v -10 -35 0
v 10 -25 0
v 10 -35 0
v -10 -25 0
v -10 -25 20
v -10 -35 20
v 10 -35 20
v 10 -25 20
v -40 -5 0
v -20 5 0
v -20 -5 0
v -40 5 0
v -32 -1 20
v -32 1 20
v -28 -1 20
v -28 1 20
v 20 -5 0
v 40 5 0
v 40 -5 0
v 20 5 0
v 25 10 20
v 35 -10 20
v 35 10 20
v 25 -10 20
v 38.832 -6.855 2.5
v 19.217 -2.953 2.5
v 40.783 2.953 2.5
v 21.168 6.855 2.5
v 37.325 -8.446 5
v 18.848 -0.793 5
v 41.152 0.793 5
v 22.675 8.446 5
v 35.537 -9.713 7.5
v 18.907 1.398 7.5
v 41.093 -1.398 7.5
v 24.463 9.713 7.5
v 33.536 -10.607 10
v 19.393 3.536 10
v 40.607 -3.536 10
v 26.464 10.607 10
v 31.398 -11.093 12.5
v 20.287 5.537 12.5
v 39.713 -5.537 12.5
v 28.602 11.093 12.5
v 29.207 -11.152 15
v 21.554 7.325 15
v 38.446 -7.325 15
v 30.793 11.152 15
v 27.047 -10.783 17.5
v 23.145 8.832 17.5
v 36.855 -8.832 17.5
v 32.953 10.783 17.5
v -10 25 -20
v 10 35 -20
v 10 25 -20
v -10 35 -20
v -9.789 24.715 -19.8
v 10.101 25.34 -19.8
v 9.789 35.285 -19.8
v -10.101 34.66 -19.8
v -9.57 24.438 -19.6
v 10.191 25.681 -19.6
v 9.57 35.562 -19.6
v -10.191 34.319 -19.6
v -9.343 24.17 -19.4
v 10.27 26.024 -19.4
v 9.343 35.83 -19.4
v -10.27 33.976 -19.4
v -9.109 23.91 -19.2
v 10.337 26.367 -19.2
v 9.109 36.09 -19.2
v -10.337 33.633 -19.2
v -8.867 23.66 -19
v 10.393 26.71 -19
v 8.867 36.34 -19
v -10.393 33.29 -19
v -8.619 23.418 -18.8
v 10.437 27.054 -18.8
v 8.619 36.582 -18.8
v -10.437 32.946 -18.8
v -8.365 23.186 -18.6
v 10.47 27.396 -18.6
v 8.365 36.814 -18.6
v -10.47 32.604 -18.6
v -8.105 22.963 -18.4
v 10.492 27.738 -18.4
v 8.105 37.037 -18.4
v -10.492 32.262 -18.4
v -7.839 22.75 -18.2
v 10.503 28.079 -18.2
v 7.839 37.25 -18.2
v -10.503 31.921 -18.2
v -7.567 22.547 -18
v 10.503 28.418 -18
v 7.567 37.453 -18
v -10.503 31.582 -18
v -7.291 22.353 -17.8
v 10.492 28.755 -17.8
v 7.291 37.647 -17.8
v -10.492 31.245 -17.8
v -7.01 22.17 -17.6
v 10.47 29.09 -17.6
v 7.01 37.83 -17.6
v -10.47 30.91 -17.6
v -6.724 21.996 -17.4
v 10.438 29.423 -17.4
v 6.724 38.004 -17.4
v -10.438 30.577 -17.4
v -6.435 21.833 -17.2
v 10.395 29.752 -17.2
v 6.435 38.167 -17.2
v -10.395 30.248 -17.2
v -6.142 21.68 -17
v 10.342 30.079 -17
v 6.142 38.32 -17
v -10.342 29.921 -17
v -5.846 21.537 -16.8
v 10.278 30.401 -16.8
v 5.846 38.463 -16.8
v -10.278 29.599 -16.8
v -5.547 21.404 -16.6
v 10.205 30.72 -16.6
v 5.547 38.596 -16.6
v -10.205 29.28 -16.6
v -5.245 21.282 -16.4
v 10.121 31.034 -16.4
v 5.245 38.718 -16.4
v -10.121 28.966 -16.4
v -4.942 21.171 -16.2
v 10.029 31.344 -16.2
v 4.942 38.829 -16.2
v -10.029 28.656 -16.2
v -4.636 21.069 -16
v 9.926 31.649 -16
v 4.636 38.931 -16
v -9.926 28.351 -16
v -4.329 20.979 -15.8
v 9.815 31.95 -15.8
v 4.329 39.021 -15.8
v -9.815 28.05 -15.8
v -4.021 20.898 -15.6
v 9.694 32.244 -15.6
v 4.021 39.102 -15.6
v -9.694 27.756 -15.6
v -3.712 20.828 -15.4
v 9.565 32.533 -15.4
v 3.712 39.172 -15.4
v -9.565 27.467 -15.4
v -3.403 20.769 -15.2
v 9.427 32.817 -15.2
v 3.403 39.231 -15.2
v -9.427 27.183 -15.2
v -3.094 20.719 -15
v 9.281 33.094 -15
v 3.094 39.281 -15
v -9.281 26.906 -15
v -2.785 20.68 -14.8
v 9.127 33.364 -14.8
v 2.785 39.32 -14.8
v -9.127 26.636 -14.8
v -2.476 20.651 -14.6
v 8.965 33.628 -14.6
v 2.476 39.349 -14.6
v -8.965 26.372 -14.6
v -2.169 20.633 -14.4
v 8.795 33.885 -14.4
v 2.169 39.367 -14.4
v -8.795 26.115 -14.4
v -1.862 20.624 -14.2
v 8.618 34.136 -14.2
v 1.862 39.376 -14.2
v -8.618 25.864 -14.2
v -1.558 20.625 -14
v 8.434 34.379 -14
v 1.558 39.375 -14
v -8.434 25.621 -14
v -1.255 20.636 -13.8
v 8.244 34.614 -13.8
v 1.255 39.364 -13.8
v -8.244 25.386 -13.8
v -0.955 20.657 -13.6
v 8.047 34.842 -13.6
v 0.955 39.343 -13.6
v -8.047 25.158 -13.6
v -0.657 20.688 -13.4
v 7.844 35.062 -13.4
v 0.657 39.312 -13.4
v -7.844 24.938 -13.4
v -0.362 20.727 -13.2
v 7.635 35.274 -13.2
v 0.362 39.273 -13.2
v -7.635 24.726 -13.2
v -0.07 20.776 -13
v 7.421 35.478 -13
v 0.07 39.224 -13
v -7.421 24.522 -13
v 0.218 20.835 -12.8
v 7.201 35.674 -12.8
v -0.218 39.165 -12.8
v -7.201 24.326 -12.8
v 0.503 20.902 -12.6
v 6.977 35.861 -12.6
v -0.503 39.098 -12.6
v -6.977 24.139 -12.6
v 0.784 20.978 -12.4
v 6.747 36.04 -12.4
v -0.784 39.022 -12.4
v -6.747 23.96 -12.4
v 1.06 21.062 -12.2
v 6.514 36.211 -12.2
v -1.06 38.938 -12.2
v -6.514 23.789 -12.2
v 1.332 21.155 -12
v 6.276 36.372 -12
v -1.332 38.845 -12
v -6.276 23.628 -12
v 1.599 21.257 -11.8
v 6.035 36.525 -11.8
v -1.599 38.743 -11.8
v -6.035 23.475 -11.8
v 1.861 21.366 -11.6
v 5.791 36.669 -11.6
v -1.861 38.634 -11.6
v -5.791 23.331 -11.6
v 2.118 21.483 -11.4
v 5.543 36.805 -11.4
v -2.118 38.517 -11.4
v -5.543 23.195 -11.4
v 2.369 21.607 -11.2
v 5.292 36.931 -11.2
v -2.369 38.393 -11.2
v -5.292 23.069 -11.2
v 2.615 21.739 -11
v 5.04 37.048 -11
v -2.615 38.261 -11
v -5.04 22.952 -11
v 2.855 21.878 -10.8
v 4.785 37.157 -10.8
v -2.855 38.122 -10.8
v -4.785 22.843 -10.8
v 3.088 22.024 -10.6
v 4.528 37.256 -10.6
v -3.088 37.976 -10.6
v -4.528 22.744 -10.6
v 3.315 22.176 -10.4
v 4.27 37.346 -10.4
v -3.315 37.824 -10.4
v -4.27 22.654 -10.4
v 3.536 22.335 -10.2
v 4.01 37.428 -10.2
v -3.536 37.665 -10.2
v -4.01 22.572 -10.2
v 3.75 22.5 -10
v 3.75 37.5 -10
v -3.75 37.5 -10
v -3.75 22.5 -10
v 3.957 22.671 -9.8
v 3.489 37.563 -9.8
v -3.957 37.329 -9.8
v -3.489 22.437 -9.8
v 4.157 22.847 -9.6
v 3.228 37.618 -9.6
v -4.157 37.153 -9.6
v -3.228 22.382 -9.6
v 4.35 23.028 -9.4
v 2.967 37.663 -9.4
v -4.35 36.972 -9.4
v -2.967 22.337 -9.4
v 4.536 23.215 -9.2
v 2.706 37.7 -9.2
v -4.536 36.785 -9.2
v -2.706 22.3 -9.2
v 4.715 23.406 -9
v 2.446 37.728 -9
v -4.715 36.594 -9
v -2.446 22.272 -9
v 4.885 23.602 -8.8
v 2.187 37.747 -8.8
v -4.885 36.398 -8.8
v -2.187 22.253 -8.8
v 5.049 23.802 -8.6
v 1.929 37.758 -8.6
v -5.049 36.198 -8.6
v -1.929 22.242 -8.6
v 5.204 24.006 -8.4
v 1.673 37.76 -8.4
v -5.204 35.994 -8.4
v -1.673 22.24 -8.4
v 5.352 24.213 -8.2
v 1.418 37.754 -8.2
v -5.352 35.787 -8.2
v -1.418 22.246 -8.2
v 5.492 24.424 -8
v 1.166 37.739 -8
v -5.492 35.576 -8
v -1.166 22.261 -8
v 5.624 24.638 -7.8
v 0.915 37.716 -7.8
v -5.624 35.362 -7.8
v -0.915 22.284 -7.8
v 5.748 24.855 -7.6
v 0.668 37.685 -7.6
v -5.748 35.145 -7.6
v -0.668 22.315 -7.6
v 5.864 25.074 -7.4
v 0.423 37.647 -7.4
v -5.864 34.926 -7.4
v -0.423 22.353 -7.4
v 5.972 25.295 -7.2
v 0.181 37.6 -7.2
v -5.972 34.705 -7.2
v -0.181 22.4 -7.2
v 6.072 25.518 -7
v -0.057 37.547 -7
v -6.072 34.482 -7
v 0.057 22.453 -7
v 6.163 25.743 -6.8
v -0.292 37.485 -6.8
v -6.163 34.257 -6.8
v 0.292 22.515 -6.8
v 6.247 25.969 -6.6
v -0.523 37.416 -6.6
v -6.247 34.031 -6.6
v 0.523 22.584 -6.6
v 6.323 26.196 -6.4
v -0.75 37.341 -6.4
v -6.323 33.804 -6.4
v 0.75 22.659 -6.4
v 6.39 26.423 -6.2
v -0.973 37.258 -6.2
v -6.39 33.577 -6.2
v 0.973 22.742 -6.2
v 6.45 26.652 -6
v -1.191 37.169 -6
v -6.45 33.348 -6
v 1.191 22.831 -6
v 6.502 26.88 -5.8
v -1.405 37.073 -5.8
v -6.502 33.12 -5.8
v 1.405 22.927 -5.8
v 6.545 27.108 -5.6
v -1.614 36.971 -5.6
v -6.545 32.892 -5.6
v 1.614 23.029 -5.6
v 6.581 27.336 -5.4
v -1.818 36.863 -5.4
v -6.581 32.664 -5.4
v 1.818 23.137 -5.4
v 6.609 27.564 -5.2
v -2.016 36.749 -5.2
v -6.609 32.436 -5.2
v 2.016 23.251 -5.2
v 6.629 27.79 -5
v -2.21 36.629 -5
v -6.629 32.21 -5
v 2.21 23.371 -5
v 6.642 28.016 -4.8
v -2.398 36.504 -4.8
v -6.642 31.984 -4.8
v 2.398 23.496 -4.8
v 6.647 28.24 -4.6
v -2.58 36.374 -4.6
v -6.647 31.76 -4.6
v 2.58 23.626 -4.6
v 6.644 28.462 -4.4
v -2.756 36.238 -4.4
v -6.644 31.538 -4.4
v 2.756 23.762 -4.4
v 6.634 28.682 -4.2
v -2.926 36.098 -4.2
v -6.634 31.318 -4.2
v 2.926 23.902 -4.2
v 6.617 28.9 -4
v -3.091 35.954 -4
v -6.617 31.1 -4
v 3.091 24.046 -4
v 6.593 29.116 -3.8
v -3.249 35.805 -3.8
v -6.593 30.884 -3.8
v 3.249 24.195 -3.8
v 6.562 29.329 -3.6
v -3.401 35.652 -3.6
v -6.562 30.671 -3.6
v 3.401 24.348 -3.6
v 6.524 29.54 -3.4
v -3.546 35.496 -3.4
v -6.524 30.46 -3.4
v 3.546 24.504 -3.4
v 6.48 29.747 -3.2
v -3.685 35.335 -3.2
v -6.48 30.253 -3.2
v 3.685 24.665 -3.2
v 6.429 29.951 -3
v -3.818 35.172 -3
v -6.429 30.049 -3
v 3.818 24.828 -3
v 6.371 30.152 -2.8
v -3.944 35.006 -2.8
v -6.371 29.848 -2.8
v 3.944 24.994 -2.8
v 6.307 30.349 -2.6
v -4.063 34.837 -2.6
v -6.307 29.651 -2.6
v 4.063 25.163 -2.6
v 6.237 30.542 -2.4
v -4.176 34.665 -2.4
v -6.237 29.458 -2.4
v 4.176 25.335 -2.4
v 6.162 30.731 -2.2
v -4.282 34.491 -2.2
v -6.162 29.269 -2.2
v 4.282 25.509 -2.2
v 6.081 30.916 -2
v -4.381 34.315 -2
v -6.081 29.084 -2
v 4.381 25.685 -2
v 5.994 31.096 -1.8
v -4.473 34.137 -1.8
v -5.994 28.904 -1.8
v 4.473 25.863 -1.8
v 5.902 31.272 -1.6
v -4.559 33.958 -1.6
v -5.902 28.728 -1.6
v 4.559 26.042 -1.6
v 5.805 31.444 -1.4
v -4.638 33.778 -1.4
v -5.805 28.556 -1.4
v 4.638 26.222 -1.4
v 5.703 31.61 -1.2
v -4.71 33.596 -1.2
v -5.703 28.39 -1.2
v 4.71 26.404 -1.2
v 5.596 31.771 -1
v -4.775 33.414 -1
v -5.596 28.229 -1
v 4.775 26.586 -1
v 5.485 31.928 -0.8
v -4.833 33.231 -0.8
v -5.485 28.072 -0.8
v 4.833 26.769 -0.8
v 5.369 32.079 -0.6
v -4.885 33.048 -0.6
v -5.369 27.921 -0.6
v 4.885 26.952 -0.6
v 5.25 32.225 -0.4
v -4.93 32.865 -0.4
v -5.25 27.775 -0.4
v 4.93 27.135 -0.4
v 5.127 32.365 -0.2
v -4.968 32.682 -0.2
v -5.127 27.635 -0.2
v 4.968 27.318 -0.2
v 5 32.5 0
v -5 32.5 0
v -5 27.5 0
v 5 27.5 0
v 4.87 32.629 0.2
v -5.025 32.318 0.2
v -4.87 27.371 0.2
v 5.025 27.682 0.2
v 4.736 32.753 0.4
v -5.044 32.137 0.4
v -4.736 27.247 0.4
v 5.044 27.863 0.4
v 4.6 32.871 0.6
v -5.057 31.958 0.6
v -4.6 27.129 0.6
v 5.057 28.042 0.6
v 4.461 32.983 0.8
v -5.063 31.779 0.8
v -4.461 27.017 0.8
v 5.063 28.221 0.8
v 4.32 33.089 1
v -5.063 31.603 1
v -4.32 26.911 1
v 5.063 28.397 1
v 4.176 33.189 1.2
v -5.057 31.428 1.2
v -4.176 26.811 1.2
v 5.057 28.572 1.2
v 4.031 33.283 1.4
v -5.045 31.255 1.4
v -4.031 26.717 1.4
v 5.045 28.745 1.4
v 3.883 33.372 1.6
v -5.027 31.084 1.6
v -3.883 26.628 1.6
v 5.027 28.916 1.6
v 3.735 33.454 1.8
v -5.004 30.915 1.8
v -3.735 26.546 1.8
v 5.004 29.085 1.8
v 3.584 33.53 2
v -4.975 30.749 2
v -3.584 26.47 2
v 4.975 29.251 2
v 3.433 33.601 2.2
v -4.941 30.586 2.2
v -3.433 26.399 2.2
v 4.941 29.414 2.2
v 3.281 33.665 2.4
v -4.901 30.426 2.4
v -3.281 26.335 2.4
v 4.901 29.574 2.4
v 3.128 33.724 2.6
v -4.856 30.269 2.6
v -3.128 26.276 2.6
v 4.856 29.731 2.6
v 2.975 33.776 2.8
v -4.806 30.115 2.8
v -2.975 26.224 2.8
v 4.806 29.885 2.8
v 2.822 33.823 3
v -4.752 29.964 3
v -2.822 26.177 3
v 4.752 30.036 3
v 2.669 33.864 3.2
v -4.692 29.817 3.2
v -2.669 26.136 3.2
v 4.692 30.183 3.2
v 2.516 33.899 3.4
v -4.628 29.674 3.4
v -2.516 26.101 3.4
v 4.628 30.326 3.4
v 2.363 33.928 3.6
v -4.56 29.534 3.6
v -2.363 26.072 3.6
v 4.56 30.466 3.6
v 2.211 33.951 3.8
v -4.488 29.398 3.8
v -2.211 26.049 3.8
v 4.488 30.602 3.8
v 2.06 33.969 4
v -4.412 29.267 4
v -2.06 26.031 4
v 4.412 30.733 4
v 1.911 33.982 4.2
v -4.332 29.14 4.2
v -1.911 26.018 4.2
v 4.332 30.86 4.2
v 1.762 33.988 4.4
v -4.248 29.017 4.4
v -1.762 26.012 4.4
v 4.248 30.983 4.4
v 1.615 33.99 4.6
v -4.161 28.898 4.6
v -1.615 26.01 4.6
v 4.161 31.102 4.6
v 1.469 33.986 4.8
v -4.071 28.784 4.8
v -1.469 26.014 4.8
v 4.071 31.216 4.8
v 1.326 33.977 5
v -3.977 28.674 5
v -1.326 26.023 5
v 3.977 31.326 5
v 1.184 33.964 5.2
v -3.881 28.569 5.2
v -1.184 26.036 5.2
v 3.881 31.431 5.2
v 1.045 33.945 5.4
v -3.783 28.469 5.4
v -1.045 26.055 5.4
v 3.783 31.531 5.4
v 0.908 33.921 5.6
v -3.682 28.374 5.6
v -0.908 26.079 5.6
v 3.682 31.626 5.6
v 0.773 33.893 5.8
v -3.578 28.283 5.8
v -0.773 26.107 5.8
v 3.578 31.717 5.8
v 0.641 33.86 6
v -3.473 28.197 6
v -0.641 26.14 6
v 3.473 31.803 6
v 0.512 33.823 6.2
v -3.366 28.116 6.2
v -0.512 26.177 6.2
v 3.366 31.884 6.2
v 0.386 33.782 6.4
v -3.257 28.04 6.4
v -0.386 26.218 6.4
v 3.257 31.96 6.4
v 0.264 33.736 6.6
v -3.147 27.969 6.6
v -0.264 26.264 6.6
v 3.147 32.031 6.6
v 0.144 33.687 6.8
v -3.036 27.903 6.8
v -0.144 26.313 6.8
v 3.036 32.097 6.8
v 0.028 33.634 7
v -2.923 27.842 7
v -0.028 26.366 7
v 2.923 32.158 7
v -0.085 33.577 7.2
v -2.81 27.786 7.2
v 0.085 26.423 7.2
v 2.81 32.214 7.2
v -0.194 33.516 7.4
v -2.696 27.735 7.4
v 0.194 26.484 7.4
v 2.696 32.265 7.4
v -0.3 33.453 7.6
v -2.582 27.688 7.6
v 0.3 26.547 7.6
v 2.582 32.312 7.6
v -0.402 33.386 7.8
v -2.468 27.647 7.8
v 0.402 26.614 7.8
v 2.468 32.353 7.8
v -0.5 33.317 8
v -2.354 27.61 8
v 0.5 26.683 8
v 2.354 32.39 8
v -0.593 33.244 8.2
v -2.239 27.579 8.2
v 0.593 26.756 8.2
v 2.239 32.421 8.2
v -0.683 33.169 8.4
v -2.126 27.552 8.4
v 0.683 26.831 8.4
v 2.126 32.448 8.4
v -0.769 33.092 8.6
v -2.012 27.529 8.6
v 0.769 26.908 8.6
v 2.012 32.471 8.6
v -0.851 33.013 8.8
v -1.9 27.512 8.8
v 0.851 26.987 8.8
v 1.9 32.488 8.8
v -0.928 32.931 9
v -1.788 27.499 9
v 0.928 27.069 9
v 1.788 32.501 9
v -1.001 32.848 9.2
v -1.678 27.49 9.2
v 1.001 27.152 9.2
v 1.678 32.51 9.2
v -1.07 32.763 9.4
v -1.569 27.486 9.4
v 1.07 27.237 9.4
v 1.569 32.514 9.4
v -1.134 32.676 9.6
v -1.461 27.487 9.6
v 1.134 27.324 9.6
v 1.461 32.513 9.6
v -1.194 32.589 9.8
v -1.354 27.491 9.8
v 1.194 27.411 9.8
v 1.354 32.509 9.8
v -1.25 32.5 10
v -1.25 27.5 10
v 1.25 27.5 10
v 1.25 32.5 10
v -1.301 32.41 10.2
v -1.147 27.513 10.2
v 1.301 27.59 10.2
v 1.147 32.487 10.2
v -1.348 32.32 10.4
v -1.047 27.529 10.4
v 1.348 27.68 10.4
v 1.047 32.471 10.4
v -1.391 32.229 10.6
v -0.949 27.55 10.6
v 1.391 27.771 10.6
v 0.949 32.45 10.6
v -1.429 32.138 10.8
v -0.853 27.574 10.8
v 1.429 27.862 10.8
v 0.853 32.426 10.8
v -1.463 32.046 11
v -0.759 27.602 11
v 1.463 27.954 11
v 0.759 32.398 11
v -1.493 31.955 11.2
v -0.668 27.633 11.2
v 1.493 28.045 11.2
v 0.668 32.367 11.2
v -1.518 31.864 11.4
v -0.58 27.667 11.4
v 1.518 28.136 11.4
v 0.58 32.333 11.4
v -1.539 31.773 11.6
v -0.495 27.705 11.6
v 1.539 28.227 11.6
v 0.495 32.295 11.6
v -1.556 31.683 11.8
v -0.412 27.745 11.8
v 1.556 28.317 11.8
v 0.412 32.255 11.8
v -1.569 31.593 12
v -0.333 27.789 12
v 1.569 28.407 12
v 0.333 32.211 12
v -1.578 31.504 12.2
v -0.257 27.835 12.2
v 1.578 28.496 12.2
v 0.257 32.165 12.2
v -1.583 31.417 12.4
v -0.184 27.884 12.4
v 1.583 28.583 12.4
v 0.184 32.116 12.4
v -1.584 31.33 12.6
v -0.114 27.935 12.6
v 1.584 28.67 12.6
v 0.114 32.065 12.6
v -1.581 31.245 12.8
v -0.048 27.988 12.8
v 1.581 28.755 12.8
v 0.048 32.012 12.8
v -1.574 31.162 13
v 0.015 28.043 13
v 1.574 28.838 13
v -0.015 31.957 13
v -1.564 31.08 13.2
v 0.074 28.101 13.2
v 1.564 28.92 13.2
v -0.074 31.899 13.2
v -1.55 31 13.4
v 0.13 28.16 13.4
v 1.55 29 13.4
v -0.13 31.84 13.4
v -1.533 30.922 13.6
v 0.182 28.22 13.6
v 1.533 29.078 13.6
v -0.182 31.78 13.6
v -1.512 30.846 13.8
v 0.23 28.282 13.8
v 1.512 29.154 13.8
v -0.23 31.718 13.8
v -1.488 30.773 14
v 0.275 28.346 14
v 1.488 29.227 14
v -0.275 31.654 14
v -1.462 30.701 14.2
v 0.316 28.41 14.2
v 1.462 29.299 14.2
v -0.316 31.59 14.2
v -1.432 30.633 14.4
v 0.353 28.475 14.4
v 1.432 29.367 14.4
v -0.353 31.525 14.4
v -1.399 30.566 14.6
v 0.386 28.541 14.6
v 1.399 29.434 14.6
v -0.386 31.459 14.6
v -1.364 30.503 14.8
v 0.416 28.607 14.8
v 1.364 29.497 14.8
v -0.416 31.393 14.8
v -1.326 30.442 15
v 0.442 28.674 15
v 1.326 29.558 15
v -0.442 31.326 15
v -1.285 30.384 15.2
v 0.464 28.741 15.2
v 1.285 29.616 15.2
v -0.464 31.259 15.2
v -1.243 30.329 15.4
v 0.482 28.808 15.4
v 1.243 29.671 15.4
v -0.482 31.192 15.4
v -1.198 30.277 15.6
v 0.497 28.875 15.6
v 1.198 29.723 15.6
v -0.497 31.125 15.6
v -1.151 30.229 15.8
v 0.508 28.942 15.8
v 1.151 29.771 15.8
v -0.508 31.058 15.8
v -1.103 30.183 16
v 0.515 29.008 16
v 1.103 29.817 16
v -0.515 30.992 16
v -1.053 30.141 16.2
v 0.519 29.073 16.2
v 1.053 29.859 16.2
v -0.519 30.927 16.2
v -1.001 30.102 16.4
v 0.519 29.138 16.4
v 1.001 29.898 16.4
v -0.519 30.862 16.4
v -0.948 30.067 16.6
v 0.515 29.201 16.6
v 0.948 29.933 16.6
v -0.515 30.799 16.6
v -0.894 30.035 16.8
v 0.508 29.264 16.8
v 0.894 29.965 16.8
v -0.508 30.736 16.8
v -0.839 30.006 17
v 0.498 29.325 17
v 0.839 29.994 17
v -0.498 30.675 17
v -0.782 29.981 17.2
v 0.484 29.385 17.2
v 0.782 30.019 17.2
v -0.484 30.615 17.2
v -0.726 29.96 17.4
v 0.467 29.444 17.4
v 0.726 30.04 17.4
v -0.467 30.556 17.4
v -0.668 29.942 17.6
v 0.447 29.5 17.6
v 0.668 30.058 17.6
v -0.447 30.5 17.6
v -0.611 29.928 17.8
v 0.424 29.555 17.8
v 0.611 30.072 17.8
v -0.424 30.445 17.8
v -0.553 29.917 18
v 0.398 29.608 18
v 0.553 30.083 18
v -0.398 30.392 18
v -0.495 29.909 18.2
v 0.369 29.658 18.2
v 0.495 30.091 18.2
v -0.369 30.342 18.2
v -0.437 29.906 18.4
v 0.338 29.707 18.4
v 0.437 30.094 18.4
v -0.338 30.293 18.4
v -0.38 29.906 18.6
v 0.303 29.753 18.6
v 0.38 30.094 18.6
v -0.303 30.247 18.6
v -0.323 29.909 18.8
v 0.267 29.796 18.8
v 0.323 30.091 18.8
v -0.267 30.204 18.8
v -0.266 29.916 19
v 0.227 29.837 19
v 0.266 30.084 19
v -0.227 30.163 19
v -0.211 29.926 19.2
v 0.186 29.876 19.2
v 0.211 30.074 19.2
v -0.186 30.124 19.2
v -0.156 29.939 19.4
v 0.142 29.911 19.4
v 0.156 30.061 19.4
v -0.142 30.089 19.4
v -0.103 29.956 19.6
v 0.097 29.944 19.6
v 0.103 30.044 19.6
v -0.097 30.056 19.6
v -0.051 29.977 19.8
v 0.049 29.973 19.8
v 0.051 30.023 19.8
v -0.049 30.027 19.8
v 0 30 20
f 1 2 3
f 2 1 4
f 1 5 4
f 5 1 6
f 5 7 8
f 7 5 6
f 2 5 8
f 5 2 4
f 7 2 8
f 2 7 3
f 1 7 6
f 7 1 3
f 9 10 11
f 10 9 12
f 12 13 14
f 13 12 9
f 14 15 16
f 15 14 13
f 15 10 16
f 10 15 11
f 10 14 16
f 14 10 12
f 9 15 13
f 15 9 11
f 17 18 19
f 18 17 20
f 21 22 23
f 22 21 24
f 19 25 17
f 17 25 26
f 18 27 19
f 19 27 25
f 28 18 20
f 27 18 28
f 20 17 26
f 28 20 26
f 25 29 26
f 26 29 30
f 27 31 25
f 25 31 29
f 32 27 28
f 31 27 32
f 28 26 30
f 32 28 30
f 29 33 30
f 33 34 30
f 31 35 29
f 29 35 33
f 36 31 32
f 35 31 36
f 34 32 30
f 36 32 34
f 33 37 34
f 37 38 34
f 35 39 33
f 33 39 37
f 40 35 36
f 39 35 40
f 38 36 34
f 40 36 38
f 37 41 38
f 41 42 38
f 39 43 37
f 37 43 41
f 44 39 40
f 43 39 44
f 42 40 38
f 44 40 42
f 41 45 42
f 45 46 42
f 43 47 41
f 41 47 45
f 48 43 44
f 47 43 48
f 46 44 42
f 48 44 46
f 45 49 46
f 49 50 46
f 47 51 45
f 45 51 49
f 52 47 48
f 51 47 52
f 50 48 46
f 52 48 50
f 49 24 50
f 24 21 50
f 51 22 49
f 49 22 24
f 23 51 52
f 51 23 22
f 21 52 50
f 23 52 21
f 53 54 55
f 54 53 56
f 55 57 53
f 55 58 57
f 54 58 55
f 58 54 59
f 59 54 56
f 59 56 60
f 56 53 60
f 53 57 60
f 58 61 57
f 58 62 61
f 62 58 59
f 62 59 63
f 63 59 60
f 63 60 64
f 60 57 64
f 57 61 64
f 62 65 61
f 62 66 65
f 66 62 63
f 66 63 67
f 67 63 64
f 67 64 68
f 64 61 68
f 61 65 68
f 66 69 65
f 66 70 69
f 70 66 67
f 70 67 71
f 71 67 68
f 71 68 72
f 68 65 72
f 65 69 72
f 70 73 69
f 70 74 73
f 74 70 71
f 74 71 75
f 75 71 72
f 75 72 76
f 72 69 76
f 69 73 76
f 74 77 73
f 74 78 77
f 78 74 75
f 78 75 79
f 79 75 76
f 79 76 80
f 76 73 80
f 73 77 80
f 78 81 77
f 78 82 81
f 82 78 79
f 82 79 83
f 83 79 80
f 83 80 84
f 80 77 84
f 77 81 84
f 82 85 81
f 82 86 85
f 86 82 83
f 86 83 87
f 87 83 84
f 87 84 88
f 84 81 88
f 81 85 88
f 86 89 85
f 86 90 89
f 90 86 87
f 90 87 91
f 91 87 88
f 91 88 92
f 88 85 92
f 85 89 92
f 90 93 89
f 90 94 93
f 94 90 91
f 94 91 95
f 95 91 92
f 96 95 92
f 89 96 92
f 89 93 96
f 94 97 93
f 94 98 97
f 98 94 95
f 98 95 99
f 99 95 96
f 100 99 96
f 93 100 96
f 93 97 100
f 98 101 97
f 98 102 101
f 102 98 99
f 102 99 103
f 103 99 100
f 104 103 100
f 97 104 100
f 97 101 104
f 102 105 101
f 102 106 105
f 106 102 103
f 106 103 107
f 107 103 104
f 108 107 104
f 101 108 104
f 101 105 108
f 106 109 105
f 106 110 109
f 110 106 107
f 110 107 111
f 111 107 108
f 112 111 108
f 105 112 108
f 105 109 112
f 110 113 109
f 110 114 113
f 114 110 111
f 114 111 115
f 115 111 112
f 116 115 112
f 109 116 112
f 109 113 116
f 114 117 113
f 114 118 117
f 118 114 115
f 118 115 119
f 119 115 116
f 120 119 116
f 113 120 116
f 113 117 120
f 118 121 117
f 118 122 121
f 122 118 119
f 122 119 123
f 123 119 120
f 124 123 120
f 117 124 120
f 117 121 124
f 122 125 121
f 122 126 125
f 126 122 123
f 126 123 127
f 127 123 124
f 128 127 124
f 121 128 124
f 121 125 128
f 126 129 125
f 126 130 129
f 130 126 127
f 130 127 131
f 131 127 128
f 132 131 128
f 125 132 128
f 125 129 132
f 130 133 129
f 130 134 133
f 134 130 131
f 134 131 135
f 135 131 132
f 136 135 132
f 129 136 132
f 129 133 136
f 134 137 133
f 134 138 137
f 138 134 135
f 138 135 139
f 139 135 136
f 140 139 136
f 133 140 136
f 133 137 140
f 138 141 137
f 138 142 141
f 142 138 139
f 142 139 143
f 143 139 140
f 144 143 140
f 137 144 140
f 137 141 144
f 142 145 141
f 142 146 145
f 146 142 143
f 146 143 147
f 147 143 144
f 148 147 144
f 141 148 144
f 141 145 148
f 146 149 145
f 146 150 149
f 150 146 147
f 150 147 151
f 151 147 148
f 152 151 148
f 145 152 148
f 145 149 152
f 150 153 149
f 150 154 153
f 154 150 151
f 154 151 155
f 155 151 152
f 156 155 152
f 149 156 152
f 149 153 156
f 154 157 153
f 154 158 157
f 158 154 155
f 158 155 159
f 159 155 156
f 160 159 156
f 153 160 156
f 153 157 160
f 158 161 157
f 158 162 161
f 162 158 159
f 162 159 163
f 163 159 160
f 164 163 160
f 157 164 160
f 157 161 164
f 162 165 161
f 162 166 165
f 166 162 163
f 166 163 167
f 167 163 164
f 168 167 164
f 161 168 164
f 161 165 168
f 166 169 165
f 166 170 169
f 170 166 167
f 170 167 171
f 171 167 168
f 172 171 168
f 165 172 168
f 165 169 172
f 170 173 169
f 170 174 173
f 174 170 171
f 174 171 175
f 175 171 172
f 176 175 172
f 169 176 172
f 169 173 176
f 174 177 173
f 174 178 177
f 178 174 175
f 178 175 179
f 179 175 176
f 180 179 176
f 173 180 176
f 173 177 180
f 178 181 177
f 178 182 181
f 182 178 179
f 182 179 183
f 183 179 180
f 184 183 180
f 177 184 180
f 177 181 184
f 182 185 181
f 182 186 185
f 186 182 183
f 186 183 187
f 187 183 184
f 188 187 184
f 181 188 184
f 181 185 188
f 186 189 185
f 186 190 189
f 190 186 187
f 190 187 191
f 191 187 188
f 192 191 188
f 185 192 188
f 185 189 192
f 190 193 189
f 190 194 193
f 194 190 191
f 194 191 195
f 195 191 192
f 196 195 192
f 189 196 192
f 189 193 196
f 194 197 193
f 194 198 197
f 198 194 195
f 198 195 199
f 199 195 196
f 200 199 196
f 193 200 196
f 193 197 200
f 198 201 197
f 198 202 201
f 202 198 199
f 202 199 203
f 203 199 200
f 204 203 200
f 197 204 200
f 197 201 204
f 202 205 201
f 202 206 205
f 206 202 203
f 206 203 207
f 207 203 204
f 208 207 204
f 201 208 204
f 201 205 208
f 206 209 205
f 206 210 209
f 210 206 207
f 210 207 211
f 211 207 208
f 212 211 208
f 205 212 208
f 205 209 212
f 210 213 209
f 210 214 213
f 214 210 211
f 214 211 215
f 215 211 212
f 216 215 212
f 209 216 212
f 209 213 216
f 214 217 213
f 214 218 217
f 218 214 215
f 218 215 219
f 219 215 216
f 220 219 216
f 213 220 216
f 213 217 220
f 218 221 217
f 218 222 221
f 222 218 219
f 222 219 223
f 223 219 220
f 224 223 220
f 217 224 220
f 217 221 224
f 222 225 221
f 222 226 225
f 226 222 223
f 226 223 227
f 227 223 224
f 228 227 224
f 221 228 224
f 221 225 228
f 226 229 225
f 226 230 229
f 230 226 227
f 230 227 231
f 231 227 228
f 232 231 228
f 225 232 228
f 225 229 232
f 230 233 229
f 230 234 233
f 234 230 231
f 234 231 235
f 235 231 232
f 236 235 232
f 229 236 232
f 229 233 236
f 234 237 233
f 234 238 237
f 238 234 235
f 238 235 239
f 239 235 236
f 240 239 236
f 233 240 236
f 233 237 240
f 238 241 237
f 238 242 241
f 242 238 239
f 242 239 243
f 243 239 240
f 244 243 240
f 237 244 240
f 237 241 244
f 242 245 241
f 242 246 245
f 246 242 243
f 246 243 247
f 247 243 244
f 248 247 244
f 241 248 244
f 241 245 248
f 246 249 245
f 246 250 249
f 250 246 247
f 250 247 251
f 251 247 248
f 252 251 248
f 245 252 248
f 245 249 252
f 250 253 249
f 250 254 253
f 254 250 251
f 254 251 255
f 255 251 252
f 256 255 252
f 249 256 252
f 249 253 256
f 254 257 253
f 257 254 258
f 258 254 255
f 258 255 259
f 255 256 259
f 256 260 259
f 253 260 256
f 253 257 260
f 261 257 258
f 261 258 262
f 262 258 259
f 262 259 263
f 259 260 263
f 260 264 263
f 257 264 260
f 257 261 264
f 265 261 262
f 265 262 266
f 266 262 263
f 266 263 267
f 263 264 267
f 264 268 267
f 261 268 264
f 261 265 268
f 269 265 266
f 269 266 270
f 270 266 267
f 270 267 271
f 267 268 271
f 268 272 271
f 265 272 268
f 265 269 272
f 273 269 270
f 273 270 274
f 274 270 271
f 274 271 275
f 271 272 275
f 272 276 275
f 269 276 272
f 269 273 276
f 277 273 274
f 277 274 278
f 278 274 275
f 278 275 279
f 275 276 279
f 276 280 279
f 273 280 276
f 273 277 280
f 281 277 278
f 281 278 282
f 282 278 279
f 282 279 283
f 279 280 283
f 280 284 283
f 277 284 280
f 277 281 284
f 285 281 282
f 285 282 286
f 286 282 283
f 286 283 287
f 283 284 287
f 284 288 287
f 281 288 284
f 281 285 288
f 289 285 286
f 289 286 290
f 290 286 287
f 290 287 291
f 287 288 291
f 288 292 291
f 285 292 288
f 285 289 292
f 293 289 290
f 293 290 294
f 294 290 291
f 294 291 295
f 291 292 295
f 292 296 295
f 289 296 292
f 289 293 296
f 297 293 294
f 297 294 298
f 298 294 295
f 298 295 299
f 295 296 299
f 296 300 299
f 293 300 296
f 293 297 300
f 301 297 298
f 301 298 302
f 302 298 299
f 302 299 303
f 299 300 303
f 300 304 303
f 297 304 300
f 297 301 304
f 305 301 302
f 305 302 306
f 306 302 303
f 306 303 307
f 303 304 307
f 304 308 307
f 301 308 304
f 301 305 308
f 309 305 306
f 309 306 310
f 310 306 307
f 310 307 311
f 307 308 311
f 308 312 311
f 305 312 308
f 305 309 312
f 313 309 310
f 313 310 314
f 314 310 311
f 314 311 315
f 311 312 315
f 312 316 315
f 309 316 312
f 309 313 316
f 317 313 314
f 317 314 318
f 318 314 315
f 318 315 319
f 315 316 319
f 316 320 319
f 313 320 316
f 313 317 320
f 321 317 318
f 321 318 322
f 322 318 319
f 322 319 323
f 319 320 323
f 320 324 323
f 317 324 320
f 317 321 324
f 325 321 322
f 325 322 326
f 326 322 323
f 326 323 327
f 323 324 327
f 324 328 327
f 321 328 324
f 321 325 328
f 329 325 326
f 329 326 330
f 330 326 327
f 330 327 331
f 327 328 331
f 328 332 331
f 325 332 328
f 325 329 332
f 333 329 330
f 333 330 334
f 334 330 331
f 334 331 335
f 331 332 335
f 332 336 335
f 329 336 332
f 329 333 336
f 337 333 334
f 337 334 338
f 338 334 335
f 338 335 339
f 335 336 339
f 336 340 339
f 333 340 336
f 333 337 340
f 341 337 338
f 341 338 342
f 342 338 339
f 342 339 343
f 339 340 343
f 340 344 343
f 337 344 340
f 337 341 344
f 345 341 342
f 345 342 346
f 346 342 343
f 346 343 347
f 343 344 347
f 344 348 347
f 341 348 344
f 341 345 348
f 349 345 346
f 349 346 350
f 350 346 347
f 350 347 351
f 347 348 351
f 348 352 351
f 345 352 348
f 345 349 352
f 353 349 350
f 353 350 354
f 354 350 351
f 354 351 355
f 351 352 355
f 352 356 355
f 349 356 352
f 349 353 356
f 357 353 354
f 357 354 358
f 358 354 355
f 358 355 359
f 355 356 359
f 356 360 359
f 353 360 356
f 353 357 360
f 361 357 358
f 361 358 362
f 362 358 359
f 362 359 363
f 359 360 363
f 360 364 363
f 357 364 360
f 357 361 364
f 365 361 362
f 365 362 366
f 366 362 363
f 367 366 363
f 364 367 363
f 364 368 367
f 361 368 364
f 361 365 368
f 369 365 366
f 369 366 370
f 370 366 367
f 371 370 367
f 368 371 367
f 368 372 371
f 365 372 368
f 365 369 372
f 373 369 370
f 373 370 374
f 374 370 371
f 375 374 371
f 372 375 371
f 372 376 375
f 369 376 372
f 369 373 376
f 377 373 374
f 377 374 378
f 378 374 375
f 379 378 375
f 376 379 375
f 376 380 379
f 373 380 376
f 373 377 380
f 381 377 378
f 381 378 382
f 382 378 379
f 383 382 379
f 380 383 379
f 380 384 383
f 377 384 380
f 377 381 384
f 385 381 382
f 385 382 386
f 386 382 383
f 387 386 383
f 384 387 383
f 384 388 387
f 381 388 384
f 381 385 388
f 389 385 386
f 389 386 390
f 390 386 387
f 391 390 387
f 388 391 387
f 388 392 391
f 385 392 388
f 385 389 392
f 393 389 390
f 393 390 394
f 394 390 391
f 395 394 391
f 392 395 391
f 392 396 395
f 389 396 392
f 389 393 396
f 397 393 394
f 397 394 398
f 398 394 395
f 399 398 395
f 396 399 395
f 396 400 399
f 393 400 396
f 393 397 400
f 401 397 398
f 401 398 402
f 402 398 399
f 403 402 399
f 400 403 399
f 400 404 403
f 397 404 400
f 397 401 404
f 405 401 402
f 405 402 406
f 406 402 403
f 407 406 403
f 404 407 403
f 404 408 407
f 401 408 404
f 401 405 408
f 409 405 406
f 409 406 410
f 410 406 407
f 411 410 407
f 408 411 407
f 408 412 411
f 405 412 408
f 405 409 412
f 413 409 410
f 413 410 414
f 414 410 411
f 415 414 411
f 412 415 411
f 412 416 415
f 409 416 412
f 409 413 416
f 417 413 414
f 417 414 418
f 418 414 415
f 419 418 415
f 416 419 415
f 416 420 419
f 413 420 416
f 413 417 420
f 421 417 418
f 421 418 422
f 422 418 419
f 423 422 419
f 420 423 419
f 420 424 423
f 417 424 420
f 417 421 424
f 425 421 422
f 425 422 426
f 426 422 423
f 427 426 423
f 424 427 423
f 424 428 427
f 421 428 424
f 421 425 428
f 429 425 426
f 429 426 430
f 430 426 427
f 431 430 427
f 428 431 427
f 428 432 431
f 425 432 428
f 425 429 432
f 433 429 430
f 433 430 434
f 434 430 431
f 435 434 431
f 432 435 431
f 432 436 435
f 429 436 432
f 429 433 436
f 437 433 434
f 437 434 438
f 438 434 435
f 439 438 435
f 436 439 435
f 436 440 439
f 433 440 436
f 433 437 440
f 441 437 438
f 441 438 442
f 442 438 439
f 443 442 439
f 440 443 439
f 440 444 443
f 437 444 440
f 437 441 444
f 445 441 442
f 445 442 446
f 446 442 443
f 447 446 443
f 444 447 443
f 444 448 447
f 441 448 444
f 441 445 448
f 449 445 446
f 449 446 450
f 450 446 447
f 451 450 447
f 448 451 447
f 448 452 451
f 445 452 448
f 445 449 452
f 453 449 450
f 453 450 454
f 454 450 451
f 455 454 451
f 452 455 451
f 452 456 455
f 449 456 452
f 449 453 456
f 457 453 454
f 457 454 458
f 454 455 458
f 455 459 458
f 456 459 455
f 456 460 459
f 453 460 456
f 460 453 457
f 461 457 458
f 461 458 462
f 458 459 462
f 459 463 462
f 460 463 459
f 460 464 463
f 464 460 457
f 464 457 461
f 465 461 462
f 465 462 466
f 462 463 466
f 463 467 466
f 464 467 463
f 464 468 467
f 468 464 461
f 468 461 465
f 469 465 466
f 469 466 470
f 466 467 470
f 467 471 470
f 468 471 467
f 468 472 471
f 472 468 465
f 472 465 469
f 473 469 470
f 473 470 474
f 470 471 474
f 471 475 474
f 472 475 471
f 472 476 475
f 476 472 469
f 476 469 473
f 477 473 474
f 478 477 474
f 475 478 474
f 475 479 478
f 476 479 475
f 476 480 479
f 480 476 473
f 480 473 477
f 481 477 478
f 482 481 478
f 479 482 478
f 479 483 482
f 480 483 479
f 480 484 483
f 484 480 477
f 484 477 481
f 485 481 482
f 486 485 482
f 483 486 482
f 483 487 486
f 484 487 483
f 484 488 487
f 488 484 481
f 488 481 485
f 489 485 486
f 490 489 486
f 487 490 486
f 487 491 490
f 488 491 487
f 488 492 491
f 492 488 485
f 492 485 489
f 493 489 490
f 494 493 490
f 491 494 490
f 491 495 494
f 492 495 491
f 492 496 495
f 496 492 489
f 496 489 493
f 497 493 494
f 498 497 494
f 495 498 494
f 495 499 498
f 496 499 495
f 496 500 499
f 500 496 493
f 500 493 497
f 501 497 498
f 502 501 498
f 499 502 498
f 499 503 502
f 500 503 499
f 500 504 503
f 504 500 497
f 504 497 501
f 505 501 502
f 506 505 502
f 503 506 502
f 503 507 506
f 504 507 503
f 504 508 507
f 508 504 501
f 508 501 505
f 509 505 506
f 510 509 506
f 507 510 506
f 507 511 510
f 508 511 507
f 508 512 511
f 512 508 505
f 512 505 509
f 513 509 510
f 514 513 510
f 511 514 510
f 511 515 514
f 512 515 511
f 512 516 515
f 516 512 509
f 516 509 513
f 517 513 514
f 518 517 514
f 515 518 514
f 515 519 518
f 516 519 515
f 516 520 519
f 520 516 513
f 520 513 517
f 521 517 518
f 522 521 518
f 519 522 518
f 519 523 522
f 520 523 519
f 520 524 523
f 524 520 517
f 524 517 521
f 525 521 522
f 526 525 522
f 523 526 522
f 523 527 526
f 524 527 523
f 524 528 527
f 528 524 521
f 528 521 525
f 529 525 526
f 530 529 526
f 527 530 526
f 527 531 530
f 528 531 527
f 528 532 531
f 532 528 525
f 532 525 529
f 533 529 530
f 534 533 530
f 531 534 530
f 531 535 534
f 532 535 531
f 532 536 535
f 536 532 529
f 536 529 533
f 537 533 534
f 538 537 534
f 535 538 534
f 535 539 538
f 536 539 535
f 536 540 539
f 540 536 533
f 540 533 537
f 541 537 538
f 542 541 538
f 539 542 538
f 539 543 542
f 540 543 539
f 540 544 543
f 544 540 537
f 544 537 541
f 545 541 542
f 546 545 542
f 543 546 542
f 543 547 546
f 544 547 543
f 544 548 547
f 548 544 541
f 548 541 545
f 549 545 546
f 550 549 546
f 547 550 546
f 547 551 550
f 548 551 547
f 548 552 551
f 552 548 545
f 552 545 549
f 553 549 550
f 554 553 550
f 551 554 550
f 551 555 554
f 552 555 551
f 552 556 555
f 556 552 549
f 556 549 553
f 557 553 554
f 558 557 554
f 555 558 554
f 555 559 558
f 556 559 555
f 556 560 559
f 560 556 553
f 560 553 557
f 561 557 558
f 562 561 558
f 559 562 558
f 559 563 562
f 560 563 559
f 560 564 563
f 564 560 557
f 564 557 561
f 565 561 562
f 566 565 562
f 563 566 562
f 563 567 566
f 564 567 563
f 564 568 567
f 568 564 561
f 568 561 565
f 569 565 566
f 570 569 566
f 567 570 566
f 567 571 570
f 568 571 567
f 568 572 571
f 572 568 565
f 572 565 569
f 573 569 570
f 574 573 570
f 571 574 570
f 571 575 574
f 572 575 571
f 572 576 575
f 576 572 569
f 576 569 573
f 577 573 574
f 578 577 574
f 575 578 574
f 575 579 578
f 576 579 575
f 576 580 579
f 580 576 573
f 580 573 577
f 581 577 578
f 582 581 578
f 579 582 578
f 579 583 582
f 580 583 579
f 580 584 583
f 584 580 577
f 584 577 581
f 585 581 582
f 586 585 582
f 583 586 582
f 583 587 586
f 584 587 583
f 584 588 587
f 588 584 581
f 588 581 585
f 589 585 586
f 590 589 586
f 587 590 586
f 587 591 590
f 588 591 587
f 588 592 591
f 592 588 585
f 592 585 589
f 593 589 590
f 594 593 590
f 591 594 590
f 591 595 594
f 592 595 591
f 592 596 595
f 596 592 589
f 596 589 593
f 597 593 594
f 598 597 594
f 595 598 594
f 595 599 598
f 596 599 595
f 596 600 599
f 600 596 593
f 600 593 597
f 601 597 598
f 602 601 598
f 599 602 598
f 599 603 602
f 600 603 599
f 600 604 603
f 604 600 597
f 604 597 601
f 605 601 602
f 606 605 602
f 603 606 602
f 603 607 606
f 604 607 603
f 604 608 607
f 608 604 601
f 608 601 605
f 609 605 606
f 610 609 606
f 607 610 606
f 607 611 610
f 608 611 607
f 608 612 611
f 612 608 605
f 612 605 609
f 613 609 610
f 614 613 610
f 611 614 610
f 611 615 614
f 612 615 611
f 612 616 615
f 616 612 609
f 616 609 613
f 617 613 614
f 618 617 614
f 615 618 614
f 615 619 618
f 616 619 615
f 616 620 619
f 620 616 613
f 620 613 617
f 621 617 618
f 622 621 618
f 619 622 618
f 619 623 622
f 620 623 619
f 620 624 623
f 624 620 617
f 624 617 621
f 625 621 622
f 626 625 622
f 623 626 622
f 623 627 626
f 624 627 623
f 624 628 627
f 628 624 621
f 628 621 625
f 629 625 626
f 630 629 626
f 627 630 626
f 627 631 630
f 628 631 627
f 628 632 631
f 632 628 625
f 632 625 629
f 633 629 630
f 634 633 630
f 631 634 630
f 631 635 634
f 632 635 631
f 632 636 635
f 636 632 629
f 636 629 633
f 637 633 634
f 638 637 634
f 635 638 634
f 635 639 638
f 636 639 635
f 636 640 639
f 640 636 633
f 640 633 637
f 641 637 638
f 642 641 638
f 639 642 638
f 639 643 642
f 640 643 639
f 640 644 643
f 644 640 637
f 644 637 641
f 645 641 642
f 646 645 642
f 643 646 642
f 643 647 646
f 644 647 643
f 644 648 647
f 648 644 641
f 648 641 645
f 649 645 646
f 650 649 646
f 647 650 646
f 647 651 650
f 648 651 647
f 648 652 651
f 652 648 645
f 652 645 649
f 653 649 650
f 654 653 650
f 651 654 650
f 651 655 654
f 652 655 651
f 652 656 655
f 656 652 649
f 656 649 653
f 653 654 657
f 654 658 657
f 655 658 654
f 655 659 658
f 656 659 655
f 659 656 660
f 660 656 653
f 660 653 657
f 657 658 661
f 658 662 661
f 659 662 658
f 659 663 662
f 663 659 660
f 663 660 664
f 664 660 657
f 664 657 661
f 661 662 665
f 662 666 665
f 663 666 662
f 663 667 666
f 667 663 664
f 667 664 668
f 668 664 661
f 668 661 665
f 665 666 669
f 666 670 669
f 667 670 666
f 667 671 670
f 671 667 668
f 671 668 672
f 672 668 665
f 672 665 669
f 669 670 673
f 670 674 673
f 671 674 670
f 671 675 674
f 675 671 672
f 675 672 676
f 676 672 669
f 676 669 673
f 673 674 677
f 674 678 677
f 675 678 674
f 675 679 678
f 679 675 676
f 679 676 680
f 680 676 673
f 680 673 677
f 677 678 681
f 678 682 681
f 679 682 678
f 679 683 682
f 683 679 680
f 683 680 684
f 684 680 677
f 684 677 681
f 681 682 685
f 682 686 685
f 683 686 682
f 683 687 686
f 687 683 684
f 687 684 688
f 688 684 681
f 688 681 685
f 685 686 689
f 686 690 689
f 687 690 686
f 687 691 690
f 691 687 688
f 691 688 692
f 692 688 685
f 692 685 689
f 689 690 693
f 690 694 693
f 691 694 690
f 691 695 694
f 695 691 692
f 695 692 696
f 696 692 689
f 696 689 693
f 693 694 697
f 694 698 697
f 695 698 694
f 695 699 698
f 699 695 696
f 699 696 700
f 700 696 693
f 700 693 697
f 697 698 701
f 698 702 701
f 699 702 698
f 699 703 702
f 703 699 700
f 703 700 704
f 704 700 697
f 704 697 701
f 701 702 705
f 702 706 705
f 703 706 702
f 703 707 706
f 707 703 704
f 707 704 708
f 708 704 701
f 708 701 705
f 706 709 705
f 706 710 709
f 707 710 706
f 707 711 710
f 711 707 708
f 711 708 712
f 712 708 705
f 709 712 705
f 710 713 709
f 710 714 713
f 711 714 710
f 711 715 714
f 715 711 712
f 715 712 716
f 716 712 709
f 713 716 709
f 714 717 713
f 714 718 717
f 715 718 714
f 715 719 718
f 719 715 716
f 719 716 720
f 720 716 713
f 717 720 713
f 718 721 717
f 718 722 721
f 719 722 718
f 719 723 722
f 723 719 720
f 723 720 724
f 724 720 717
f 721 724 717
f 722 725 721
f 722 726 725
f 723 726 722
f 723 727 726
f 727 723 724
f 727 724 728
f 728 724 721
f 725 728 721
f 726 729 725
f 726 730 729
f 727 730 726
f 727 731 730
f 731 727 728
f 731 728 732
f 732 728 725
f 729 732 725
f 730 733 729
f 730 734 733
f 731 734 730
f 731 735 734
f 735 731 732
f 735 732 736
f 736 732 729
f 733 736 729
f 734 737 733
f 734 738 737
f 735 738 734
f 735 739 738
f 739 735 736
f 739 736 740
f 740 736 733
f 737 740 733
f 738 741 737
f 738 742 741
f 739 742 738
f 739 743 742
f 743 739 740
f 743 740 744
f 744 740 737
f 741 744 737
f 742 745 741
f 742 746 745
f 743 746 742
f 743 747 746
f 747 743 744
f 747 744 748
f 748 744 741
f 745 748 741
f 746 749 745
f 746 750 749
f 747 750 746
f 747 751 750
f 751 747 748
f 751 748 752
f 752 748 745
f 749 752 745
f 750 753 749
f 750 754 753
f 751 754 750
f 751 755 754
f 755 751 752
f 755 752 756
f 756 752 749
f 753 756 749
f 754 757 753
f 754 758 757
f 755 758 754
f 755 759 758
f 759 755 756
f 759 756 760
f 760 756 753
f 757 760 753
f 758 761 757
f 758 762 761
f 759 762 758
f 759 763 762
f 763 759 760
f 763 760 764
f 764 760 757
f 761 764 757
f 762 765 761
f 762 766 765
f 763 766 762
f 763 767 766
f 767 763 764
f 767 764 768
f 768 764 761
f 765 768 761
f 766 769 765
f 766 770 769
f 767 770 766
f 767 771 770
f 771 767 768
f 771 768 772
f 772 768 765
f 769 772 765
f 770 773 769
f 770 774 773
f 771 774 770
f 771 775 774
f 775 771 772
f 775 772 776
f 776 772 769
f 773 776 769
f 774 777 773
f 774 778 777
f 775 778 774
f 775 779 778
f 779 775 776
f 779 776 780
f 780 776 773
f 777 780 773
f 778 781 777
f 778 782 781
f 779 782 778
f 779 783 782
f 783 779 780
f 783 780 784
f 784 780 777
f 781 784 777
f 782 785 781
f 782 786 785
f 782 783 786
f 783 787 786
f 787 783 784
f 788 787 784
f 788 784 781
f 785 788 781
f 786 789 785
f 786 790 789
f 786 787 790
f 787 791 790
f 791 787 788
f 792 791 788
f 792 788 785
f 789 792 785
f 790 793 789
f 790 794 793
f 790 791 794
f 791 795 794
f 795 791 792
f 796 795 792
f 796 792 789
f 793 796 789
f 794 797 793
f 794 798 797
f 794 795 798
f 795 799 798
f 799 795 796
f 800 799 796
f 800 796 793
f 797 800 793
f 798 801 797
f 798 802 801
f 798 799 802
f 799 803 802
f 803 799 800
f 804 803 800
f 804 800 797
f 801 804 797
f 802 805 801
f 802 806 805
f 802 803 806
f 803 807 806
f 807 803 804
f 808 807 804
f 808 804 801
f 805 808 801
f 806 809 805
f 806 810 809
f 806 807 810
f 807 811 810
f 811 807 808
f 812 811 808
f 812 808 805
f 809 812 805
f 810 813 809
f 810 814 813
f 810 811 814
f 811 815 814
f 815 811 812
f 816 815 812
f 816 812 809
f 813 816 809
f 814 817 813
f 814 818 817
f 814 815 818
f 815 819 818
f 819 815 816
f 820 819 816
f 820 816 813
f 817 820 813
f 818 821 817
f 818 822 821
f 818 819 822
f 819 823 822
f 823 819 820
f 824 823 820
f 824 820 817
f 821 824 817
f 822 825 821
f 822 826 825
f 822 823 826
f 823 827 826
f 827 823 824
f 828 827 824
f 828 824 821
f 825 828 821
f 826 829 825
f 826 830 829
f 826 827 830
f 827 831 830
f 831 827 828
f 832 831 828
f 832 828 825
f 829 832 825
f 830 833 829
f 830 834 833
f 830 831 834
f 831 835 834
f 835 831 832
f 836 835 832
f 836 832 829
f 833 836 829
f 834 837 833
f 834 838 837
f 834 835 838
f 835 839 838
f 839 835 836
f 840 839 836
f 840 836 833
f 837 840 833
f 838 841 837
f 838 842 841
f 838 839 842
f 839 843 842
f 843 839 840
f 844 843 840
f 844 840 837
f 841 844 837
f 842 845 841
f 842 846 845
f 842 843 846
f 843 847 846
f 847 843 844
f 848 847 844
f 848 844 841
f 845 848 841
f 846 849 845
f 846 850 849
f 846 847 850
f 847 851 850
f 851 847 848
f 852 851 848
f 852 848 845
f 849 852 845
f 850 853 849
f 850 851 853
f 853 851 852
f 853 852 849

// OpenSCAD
echo(version=version());

// simple 2D -> 3D extrusion of a rectangle
color("red")
    translate([0, -30, 0])
        linear_extrude(height = 20)
            square([20, 10], center = true);

// using the scale parameter a frustum can be constructed
color("green")
    translate([-30, 0, 0])
        linear_extrude(height = 20, scale = 0.2)
            square([20, 10], center = true);

// with twist the extruded shape will rotate around the Z axis
color("cyan")
    translate([30, 0, 0])
        linear_extrude(height = 20, twist = 90)
            square([20, 10], center = true);

// combining both relatively complex shapes can be created
color("gray")
    translate([0, 30, 0])
        linear_extrude(height = 40, twist = -360, scale = 0, center = true, slices = 200)
            square([20, 10], center = true);

// Written in 2015 by Torsten Paul &ltTorsten.Paul@gmx.de>
//
// To the extent possible under law, the author(s) have dedicated all
// copyright and related and neighboring rights to this software to the
// public domain worldwide. This software is distributed without any
// warranty.
//
// You should have received a copy of the CC0 Public Domain
// Dedication along with this software.
// If not, see &lthttp://creativecommons.org/publicdomain/zero/1.0/&gt.
